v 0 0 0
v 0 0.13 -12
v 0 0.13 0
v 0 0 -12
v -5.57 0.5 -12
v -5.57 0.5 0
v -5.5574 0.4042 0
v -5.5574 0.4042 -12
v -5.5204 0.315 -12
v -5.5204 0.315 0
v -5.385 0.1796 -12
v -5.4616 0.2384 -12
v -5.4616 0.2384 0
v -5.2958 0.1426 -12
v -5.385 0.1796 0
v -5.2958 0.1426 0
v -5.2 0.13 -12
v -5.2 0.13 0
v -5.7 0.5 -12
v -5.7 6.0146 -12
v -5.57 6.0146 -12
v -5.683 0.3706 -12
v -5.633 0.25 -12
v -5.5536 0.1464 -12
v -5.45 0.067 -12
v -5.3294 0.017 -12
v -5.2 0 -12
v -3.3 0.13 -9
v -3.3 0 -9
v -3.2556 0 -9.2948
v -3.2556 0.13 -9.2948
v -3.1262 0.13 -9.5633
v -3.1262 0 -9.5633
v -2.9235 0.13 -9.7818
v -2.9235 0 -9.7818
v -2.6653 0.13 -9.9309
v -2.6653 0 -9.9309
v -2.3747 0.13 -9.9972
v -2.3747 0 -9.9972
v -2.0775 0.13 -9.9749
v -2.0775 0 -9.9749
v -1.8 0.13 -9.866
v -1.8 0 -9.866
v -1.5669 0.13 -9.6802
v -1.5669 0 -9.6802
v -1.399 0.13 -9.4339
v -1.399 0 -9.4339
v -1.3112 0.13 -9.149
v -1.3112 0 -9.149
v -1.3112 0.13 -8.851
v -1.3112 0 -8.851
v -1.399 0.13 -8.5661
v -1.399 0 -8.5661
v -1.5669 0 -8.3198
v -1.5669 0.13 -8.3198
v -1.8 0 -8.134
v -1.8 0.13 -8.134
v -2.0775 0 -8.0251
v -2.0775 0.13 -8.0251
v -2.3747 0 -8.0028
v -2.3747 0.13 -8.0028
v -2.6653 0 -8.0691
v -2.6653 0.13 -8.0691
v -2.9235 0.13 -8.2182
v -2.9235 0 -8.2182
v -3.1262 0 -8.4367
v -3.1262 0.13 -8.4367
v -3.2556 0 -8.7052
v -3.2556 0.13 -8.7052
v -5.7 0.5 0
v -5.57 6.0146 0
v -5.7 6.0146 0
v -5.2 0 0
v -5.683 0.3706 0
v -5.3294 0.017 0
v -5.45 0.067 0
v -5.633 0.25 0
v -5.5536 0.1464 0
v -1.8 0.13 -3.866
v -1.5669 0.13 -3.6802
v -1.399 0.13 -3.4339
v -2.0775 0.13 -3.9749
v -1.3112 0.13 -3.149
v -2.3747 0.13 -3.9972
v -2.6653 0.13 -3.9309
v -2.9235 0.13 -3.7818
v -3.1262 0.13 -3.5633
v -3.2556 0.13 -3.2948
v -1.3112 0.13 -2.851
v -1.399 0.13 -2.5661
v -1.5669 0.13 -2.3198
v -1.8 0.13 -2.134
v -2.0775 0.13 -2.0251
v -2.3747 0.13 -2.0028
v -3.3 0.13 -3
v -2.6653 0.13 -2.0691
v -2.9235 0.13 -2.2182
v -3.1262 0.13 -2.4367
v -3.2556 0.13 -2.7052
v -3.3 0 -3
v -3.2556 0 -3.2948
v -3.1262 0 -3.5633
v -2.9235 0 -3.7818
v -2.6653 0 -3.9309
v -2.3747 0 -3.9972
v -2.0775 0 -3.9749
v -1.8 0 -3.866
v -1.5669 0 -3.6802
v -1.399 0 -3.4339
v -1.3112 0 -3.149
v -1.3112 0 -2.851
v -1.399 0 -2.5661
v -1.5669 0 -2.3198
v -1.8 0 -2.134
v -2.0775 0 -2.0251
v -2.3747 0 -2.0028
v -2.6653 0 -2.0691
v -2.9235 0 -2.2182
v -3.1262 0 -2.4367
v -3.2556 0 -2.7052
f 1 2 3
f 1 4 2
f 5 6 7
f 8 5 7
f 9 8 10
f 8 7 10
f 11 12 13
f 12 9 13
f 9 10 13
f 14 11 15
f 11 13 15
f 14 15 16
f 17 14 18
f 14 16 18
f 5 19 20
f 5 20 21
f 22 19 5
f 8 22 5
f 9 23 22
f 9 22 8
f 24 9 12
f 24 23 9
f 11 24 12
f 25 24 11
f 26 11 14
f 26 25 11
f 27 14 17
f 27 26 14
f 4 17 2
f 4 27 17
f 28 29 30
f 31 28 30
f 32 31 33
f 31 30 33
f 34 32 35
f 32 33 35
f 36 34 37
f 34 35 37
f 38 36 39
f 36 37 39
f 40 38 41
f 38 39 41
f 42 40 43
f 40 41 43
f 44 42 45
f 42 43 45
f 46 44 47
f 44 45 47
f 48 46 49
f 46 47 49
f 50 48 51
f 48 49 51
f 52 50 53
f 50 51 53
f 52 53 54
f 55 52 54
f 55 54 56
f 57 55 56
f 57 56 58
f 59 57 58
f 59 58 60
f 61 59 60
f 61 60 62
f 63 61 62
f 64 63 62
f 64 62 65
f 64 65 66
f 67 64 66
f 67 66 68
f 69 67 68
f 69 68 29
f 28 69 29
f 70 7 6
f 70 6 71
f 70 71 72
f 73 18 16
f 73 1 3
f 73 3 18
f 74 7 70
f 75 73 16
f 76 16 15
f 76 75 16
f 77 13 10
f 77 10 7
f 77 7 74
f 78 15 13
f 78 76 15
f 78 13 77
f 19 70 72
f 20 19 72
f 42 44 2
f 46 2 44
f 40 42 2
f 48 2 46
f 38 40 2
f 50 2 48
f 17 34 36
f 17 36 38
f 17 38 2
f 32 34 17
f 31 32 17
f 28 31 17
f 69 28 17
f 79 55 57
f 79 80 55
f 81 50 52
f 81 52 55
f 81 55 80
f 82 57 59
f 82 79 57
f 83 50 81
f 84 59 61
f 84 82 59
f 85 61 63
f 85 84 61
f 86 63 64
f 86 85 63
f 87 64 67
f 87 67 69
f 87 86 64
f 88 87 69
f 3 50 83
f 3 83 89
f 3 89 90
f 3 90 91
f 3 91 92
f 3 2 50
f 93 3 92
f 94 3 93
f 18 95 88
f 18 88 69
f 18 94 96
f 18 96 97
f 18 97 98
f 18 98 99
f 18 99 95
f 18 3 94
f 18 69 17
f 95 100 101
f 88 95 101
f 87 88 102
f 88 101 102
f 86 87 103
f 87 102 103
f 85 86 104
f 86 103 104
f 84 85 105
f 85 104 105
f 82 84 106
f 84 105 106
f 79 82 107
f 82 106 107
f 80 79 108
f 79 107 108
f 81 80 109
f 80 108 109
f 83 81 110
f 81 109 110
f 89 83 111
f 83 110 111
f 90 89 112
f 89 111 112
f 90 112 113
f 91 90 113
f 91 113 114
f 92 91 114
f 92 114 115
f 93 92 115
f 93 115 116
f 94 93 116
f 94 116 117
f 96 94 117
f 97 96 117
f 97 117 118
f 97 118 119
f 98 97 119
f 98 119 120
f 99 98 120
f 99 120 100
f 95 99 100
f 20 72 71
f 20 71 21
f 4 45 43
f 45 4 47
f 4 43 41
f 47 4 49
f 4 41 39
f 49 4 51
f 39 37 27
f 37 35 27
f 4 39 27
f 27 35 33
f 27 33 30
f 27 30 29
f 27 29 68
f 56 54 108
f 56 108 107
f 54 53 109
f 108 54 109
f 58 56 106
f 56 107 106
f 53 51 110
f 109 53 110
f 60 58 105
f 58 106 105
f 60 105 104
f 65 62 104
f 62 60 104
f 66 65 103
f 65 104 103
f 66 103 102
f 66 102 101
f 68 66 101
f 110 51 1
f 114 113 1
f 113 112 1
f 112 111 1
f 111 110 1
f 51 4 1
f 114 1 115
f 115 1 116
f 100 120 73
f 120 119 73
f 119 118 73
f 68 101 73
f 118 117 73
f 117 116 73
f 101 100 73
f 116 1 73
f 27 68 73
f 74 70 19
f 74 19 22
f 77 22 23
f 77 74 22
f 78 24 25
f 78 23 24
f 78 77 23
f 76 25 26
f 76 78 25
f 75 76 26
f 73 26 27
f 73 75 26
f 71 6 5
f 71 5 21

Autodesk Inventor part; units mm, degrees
ref_plane "YZ Plane" through (0, 0, 0) normal (1, 0, 0) x (0, 1, 0)
ref_plane "XZ Plane" through (0, 0, 0) normal (0, 1, 0) x (-1, 0, 0)
ref_plane "XY Plane" through (0, 0, 0) normal (0, 0, 1) x (1, 0, 0)
sketch "Sketch1" plane through (0, 0, 0) normal (0, 1, 0) x (-1, 0, 0)
  line L0 (0, 0) -> (11.5, 0)
  line L1 (11.5, 0) -> (11.5, -12)
  line L2 (11.5, -12) -> (0, -12)
  line L3 (0, -12) -> (0, 0)
  line L4 (0, -12) -> (5.2, -12)
  line L5 (5.2, -12) -> (5.2, 0)
  line L6 (5.2, 0) -> (0, 0)
  line L7 (0, 0) -> (0, -12)
  line L8 (0, 0) -> (2.3, 0)
  line L9 (2.3, 0) -> (2.3, -12)
  line L10 (2.3, -12) -> (0, -12)
  line L11 (0, -12) -> (0, 0)
  line L12 (2.3, 0) -> (2.3, -3)
  line L13 (2.3, -3) -> (2.3, -9)
  circle A0 centre (2.3, -3) radius 1
  circle A1 centre (2.3, -9) radius 1
  dimension "d0" = 11.5
  dimension "d1" = 12
  dimension "d2" = 5.2
  dimension "d3" = 2.3
  dimension "d4" = 3
  dimension "d5" = 6
  dimension "d6" = 2
  dimension "d7" = 2
extrude "Extrusion1" add sketch "Sketch1" along normal blind 0.13 contours L0 L9 A0 A1 L2 L3 | L0 L5 L2 L9 A1 A0 | L0 L1 L2 L5
bend part "Bend Part1" radius 0.5 angle 90 line through (-5.2, 0, -12) along (0, 0, 1) centre toward (0, 1, 0) moving side (-1, 0, 0) both sides no
properties part number "Clmap for sample mount for new Leica System"
